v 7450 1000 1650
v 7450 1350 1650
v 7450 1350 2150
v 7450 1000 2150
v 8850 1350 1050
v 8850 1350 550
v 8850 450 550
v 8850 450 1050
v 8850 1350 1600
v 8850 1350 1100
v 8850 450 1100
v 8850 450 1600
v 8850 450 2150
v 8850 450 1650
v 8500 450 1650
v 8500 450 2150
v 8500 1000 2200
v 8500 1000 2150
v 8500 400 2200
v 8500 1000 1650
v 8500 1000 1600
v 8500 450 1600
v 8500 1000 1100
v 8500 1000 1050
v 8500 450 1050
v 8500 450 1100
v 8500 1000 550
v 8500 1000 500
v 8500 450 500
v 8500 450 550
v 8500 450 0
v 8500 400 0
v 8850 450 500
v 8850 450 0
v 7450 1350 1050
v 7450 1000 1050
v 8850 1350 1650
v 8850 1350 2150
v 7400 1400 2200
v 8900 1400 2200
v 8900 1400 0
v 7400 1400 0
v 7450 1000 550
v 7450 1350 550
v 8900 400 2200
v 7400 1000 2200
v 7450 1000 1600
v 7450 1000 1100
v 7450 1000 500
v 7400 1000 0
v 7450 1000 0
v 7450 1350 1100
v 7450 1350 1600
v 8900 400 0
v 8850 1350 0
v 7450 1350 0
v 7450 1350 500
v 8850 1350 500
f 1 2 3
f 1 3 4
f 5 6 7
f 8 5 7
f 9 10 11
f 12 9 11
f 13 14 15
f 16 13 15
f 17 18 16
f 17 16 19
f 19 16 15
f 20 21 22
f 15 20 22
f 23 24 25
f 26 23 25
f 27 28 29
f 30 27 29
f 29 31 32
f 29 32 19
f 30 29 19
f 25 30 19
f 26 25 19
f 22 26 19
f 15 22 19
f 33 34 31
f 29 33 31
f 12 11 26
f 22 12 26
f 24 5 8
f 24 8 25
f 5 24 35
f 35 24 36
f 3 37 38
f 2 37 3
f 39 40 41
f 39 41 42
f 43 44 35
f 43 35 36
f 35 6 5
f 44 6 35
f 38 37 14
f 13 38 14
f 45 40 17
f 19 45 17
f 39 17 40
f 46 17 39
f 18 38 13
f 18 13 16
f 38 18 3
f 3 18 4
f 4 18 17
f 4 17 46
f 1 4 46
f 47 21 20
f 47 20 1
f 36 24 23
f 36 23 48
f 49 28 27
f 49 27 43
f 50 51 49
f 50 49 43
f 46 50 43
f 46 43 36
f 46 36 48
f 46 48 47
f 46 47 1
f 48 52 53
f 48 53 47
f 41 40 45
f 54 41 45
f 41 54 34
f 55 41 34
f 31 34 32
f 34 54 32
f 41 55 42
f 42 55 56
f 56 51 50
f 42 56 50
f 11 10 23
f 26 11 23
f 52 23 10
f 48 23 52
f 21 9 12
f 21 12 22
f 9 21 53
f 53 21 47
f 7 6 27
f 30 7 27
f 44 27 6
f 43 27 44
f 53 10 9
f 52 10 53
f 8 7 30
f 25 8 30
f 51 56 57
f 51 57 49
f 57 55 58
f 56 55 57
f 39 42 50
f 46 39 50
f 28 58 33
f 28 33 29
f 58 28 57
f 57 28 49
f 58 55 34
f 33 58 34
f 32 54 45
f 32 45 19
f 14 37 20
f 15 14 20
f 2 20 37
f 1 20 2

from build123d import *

# Parameters (mm, degrees)
BOX3529_W        = 1400
BOX3529_H        = 900
BOX3529_DEPTH    = 500
ARRAY281_Z_COUNT = 4
ARRAY281_Z_PITCH = 550
BOX3527_W        = 400
BOX3527_H        = 600
BOX3527_DEPTH    = 2200
BOX3528_W        = 1500
BOX3528_H        = 400
BOX3528_DEPTH    = 2200


with BuildPart() as array281:
    # Box3529 → Box3529 (new body)
    with BuildSketch(Plane(origin=(8850, 1350, 0), x_dir=(-1, 0, 0), z_dir=(0, 0, 1))):
        with Locations((700, 450)):
            Rectangle(BOX3529_W, BOX3529_H)
    extrude(amount=BOX3529_DEPTH)

    # Array281 Z: Array281 ×4


with BuildPart() as array281_1:
    add(array281.part)
    with Locations(*[(0, 0, i * ARRAY281_Z_PITCH) for i in range(1, ARRAY281_Z_COUNT)]):
        add(array281.part)


with BuildPart() as box3527:
    # Box3527 → Box3527 (new body)
    with BuildSketch(Plane(origin=(8900, 1000, 0), x_dir=(-1, 0, 0), z_dir=(0, 0, 1))):
        with Locations((200, 300)):
            Rectangle(BOX3527_W, BOX3527_H)
    extrude(amount=BOX3527_DEPTH)


with BuildPart() as cut003:
    # Box3528 → Box3528 (new body)
    with BuildSketch(Plane(origin=(8900, 1400, 0), x_dir=(-1, 0, 0), z_dir=(0, 0, 1))):
        with Locations((750, 200)):
            Rectangle(BOX3528_W, BOX3528_H)
    extrude(amount=BOX3528_DEPTH)

    # Fusion015: union Box3527
    add(box3527.part)

    # Cut003: cut Array281
    add(array281_1.part, mode=Mode.SUBTRACT)


solid = cut003.part
